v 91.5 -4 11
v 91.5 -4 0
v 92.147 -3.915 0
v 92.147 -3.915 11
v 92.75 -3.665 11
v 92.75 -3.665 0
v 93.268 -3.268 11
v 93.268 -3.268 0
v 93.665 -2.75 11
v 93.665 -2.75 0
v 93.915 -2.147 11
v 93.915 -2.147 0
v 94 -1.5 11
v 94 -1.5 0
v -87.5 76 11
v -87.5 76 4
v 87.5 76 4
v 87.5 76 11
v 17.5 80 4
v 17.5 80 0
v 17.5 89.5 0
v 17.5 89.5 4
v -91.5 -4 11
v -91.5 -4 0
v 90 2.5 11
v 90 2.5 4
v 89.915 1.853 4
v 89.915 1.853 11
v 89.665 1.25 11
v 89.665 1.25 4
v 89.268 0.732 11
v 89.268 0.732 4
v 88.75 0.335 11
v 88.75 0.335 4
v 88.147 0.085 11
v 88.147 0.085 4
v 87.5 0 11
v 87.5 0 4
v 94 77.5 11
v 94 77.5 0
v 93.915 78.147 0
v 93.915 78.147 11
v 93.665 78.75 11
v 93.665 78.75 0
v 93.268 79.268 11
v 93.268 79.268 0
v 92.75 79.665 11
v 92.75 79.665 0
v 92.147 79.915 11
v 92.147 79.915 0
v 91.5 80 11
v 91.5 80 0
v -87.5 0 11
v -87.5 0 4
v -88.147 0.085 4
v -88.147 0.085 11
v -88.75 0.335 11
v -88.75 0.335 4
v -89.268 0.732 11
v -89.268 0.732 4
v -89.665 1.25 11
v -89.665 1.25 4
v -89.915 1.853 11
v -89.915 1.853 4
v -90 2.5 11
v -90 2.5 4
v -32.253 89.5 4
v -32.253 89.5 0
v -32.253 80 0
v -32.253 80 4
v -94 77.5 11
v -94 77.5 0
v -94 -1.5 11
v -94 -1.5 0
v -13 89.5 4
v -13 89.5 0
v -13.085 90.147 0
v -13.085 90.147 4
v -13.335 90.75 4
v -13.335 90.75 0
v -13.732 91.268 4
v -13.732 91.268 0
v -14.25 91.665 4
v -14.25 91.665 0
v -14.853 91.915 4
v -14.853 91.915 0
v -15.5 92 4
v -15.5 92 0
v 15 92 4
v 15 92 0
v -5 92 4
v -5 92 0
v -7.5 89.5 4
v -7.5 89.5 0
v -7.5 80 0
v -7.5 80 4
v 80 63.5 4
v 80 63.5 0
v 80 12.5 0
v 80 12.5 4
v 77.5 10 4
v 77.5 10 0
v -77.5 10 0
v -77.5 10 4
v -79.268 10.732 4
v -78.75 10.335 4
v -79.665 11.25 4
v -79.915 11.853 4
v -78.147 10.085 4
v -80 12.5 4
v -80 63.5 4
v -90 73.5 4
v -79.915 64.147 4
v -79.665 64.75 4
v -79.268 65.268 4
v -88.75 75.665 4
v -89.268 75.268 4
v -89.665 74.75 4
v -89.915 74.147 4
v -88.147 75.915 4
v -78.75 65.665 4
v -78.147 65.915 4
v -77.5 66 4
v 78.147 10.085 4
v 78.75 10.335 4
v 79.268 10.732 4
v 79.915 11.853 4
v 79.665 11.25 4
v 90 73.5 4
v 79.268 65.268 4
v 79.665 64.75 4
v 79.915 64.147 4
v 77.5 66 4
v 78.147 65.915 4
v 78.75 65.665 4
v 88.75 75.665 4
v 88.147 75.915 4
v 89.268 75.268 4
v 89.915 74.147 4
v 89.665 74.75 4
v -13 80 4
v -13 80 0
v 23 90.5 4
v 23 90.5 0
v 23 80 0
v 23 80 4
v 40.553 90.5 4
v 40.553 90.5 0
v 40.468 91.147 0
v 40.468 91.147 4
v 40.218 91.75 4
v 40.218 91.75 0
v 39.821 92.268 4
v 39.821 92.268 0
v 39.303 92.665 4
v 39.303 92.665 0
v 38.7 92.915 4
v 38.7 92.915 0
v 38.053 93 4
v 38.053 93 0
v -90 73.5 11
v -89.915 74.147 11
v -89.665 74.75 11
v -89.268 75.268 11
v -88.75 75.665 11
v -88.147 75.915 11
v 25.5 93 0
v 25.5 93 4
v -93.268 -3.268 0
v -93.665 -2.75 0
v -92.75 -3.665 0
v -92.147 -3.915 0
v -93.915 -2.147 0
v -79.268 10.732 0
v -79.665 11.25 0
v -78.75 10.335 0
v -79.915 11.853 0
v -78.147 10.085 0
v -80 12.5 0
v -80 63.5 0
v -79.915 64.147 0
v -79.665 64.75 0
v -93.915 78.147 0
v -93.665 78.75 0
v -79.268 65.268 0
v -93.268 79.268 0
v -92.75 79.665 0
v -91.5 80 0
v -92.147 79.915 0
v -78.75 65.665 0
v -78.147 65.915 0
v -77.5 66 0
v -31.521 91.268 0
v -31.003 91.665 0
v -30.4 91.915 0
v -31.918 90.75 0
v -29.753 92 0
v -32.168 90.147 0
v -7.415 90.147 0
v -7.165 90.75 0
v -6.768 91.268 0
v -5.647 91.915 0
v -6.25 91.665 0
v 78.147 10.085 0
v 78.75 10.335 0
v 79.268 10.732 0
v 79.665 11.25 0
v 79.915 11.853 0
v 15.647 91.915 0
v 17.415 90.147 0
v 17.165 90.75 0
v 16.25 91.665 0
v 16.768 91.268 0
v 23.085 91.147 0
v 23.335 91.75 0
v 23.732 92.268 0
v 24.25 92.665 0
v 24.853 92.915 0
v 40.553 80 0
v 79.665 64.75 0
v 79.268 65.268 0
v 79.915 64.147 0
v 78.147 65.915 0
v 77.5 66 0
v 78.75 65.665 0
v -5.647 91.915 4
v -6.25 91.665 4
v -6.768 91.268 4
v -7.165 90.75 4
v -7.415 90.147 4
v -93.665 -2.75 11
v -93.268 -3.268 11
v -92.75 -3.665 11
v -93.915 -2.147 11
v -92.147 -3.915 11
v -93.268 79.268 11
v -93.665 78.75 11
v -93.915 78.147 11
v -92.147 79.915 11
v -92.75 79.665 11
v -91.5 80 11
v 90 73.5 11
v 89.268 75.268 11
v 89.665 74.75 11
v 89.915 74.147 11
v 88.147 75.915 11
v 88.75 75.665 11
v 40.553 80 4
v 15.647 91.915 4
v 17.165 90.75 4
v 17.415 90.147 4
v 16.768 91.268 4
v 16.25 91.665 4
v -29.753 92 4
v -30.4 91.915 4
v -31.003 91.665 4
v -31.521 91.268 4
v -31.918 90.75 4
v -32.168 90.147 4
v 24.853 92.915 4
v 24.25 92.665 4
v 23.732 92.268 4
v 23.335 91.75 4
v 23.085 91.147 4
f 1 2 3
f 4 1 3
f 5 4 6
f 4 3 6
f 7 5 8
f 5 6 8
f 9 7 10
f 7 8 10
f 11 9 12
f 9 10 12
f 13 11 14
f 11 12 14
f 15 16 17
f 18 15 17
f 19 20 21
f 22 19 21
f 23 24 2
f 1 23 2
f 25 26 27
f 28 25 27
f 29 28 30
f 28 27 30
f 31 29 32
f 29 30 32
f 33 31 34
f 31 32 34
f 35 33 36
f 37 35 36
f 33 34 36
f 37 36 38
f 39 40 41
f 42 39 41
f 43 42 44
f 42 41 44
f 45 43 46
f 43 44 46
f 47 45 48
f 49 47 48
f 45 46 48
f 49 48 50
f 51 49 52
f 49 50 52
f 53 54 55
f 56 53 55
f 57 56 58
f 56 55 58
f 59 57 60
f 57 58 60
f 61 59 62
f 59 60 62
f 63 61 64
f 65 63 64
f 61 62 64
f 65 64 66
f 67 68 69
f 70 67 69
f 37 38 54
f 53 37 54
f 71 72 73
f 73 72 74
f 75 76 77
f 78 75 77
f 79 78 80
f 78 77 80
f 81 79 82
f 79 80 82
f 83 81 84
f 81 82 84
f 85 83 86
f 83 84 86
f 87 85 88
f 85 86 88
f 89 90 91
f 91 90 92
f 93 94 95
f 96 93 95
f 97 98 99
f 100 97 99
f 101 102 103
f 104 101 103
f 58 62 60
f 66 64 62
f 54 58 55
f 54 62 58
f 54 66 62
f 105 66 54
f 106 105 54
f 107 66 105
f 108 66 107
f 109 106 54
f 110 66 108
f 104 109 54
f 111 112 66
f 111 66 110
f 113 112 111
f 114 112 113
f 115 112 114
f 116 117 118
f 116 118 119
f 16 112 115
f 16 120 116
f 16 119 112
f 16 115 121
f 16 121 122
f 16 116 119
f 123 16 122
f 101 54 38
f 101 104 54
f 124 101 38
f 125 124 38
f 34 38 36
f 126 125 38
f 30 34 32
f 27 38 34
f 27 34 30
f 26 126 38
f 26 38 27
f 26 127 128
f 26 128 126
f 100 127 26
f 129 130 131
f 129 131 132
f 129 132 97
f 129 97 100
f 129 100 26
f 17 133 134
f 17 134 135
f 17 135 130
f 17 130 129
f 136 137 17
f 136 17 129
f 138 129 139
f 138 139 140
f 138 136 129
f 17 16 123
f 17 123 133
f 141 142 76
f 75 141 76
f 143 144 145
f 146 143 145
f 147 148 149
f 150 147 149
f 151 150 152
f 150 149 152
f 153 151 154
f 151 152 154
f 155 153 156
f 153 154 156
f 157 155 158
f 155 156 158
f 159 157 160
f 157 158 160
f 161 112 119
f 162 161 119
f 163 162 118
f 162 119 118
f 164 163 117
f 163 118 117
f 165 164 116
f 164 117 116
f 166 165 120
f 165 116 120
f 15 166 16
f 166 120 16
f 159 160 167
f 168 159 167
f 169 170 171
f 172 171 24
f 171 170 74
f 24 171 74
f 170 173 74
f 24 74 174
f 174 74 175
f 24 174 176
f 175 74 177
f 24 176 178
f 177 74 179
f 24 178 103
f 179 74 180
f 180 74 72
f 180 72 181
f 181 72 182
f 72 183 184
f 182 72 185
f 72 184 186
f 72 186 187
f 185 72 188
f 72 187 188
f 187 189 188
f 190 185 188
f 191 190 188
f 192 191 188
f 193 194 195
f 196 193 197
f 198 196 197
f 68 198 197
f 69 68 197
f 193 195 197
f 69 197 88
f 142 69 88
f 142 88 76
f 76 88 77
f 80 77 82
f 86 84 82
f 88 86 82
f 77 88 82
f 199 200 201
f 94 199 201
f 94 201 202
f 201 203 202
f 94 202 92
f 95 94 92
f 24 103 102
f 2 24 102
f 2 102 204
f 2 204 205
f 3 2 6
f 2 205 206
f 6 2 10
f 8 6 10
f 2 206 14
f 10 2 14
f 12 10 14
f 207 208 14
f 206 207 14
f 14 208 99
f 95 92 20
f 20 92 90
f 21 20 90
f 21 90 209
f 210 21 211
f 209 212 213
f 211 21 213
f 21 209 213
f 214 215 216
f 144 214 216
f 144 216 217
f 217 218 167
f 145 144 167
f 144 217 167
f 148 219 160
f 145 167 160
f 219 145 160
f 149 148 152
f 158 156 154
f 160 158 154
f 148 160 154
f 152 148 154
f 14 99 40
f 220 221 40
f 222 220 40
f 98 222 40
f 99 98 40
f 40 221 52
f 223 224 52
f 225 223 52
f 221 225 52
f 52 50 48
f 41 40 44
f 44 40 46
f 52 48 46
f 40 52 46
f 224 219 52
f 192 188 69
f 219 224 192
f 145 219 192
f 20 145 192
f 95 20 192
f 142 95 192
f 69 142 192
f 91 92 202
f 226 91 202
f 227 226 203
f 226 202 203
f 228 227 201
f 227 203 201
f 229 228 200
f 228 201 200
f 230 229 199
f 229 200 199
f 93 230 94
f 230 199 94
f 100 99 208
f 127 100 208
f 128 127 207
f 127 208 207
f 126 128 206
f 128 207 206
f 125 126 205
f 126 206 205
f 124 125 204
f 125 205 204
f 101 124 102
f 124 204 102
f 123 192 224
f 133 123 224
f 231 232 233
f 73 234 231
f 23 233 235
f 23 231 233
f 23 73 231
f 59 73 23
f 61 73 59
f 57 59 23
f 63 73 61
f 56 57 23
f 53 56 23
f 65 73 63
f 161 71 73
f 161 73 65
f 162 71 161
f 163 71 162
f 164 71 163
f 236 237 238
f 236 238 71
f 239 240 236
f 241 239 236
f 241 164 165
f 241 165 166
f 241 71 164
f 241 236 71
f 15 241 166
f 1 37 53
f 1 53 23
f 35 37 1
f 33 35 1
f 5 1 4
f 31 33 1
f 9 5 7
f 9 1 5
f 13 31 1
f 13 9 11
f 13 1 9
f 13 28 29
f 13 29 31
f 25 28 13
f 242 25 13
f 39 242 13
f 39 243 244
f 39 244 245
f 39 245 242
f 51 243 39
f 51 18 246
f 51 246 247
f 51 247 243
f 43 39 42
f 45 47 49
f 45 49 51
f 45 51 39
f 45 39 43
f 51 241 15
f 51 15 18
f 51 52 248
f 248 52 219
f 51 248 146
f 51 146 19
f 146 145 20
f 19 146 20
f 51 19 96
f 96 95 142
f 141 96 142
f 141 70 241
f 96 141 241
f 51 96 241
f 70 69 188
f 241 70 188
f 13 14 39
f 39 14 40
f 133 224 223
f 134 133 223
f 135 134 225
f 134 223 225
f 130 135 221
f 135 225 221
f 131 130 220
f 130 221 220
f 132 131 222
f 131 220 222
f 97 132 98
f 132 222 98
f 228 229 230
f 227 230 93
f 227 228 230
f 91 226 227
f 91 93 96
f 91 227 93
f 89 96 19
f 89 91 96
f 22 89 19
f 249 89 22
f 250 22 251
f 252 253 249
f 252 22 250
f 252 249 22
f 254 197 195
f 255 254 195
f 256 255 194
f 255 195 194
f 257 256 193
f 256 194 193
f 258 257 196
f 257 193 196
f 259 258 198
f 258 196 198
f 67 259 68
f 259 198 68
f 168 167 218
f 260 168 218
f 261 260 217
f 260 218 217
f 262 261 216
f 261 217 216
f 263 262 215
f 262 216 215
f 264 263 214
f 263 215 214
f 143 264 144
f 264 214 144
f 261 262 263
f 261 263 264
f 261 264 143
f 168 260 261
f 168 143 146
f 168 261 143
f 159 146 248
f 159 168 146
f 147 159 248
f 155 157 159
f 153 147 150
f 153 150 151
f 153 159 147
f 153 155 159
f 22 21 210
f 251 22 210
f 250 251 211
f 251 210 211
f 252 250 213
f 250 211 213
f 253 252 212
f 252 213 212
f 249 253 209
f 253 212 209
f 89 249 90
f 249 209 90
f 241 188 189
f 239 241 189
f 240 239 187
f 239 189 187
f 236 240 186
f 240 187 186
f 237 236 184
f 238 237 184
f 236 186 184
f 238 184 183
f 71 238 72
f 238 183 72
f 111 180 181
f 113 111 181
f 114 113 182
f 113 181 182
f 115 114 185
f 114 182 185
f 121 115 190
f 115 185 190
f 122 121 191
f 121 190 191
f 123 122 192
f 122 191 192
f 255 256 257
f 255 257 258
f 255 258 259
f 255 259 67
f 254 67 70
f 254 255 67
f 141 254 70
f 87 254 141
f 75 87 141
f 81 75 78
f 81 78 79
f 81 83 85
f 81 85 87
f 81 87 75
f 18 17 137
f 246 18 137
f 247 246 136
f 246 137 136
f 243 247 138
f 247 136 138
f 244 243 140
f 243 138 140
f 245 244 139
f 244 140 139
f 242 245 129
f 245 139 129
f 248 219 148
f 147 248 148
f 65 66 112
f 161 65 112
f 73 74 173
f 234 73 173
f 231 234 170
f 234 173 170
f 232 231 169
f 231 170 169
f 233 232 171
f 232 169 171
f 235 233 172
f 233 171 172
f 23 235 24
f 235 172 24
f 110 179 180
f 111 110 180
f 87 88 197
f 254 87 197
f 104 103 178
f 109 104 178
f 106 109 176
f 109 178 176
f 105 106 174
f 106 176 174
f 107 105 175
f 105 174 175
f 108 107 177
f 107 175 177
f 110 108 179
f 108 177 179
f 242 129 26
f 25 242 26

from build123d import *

# Parameters (mm, degrees)
F1_DEPTH = 11
F2_DEPTH = 4


with BuildPart() as f1:
    # F0 (on Top) → F1 (new body)
    with BuildSketch(Plane.XY):
        with BuildLine():
            ThreePointArc((94, 77.5), (93.267767, 79.267767), (91.5, 80))
            Line((91.5, 80), (40.553054, 80))
            Line((40.553054, 80), (23, 80))
            Line((23, 80), (17.5, 80))
            Line((17.5, 80), (-7.5, 80))
            Line((-7.5, 80), (-13, 80))
            Line((-13, 80), (-32.2531, 80))
            Line((-32.2531, 80), (-74.5, 80))
            Line((-74.5, 80), (-91.5, 80))
            ThreePointArc((-91.5, 80), (-93.267767, 79.267767), (-94, 77.5))
            Line((-94, 77.5), (-94, 76))
            Line((-94, 76), (-94, 0))
            Line((-94, 0), (-94, -1.5))
            ThreePointArc((-94, -1.5), (-93.267767, -3.267767), (-91.5, -4))
            Line((-91.5, -4), (-88, -4))
            Line((-88, -4), (88, -4))
            Line((88, -4), (91.5, -4))
            ThreePointArc((91.5, -4), (93.267767, -3.267767), (94, -1.5))
            Line((94, -1.5), (94, 0))
            Line((94, 0), (94, 76))
            Line((94, 76), (94, 77.5))
        make_face()
        with BuildLine():
            ThreePointArc((90, 2.5), (89.267767, 0.732233), (87.5, 0))
            Line((87.5, 0), (-87.5, 0))
            ThreePointArc((-87.5, 0), (-89.267767, 0.732233), (-90, 2.5))
            Line((-90, 2.5), (-90, 73.5))
            ThreePointArc((-90, 73.5), (-89.267767, 75.267767), (-87.5, 76))
            Line((-87.5, 76), (87.5, 76))
            ThreePointArc((87.5, 76), (89.267767, 75.267767), (90, 73.5))
            Line((90, 73.5), (90, 2.5))
        make_face(mode=Mode.SUBTRACT)
    extrude(amount=F1_DEPTH)

    # F0 (on Top) → F2 (join)
    with BuildSketch(Plane.XY):
        with BuildLine():
            Line((-87.5, 0), (87.5, 0))
            ThreePointArc((87.5, 0), (89.267767, 0.732233), (90, 2.5))
            Line((90, 2.5), (90, 73.5))
            ThreePointArc((90, 73.5), (89.267767, 75.267767), (87.5, 76))
            Line((87.5, 76), (-87.5, 76))
            ThreePointArc((-87.5, 76), (-89.267767, 75.267767), (-90, 73.5))
            Line((-90, 73.5), (-90, 2.5))
            ThreePointArc((-90, 2.5), (-89.267767, 0.732233), (-87.5, 0))
        make_face()
        with BuildLine():
            Line((-77.5, 66), (77.5, 66))
            ThreePointArc((77.5, 66), (79.267767, 65.267767), (80, 63.5))
            Line((80, 63.5), (80, 12.5))
            ThreePointArc((80, 12.5), (79.267767, 10.732233), (77.5, 10))
            Line((77.5, 10), (-77.5, 10))
            ThreePointArc((-77.5, 10), (-79.267767, 10.732233), (-80, 12.5))
            Line((-80, 12.5), (-80, 63.5))
            ThreePointArc((-80, 63.5), (-79.267767, 65.267767), (-77.5, 66))
        make_face(mode=Mode.SUBTRACT)
        with BuildLine():
            Line((-32.2531, 80), (-13, 80))
            Line((-13, 80), (-13, 89.5))
            ThreePointArc((-13, 89.5), (-13.732233, 91.267767), (-15.5, 92))
            Line((-15.5, 92), (-29.7531, 92))
            ThreePointArc((-29.7531, 92), (-31.520867, 91.267767), (-32.2531, 89.5))
            Line((-32.2531, 89.5), (-32.2531, 80))
        make_face()
        with BuildLine():
            Line((-7.5, 80), (17.5, 80))
            Line((17.5, 80), (17.5, 89.5))
            ThreePointArc((17.5, 89.5), (16.767767, 91.267767), (15, 92))
            Line((15, 92), (-5, 92))
            ThreePointArc((-5, 92), (-6.767767, 91.267767), (-7.5, 89.5))
            Line((-7.5, 89.5), (-7.5, 80))
        make_face()
        with BuildLine():
            Line((23, 80), (40.553054, 80))
            Line((40.553054, 80), (40.553054, 90.5))
            ThreePointArc((40.553054, 90.5), (39.820821, 92.267767), (38.053054, 93))
            Line((38.053054, 93), (25.5, 93))
            ThreePointArc((25.5, 93), (23.732233, 92.267767), (23, 90.5))
            Line((23, 90.5), (23, 80))
        make_face()
    extrude(amount=F2_DEPTH)


solid = f1.part
